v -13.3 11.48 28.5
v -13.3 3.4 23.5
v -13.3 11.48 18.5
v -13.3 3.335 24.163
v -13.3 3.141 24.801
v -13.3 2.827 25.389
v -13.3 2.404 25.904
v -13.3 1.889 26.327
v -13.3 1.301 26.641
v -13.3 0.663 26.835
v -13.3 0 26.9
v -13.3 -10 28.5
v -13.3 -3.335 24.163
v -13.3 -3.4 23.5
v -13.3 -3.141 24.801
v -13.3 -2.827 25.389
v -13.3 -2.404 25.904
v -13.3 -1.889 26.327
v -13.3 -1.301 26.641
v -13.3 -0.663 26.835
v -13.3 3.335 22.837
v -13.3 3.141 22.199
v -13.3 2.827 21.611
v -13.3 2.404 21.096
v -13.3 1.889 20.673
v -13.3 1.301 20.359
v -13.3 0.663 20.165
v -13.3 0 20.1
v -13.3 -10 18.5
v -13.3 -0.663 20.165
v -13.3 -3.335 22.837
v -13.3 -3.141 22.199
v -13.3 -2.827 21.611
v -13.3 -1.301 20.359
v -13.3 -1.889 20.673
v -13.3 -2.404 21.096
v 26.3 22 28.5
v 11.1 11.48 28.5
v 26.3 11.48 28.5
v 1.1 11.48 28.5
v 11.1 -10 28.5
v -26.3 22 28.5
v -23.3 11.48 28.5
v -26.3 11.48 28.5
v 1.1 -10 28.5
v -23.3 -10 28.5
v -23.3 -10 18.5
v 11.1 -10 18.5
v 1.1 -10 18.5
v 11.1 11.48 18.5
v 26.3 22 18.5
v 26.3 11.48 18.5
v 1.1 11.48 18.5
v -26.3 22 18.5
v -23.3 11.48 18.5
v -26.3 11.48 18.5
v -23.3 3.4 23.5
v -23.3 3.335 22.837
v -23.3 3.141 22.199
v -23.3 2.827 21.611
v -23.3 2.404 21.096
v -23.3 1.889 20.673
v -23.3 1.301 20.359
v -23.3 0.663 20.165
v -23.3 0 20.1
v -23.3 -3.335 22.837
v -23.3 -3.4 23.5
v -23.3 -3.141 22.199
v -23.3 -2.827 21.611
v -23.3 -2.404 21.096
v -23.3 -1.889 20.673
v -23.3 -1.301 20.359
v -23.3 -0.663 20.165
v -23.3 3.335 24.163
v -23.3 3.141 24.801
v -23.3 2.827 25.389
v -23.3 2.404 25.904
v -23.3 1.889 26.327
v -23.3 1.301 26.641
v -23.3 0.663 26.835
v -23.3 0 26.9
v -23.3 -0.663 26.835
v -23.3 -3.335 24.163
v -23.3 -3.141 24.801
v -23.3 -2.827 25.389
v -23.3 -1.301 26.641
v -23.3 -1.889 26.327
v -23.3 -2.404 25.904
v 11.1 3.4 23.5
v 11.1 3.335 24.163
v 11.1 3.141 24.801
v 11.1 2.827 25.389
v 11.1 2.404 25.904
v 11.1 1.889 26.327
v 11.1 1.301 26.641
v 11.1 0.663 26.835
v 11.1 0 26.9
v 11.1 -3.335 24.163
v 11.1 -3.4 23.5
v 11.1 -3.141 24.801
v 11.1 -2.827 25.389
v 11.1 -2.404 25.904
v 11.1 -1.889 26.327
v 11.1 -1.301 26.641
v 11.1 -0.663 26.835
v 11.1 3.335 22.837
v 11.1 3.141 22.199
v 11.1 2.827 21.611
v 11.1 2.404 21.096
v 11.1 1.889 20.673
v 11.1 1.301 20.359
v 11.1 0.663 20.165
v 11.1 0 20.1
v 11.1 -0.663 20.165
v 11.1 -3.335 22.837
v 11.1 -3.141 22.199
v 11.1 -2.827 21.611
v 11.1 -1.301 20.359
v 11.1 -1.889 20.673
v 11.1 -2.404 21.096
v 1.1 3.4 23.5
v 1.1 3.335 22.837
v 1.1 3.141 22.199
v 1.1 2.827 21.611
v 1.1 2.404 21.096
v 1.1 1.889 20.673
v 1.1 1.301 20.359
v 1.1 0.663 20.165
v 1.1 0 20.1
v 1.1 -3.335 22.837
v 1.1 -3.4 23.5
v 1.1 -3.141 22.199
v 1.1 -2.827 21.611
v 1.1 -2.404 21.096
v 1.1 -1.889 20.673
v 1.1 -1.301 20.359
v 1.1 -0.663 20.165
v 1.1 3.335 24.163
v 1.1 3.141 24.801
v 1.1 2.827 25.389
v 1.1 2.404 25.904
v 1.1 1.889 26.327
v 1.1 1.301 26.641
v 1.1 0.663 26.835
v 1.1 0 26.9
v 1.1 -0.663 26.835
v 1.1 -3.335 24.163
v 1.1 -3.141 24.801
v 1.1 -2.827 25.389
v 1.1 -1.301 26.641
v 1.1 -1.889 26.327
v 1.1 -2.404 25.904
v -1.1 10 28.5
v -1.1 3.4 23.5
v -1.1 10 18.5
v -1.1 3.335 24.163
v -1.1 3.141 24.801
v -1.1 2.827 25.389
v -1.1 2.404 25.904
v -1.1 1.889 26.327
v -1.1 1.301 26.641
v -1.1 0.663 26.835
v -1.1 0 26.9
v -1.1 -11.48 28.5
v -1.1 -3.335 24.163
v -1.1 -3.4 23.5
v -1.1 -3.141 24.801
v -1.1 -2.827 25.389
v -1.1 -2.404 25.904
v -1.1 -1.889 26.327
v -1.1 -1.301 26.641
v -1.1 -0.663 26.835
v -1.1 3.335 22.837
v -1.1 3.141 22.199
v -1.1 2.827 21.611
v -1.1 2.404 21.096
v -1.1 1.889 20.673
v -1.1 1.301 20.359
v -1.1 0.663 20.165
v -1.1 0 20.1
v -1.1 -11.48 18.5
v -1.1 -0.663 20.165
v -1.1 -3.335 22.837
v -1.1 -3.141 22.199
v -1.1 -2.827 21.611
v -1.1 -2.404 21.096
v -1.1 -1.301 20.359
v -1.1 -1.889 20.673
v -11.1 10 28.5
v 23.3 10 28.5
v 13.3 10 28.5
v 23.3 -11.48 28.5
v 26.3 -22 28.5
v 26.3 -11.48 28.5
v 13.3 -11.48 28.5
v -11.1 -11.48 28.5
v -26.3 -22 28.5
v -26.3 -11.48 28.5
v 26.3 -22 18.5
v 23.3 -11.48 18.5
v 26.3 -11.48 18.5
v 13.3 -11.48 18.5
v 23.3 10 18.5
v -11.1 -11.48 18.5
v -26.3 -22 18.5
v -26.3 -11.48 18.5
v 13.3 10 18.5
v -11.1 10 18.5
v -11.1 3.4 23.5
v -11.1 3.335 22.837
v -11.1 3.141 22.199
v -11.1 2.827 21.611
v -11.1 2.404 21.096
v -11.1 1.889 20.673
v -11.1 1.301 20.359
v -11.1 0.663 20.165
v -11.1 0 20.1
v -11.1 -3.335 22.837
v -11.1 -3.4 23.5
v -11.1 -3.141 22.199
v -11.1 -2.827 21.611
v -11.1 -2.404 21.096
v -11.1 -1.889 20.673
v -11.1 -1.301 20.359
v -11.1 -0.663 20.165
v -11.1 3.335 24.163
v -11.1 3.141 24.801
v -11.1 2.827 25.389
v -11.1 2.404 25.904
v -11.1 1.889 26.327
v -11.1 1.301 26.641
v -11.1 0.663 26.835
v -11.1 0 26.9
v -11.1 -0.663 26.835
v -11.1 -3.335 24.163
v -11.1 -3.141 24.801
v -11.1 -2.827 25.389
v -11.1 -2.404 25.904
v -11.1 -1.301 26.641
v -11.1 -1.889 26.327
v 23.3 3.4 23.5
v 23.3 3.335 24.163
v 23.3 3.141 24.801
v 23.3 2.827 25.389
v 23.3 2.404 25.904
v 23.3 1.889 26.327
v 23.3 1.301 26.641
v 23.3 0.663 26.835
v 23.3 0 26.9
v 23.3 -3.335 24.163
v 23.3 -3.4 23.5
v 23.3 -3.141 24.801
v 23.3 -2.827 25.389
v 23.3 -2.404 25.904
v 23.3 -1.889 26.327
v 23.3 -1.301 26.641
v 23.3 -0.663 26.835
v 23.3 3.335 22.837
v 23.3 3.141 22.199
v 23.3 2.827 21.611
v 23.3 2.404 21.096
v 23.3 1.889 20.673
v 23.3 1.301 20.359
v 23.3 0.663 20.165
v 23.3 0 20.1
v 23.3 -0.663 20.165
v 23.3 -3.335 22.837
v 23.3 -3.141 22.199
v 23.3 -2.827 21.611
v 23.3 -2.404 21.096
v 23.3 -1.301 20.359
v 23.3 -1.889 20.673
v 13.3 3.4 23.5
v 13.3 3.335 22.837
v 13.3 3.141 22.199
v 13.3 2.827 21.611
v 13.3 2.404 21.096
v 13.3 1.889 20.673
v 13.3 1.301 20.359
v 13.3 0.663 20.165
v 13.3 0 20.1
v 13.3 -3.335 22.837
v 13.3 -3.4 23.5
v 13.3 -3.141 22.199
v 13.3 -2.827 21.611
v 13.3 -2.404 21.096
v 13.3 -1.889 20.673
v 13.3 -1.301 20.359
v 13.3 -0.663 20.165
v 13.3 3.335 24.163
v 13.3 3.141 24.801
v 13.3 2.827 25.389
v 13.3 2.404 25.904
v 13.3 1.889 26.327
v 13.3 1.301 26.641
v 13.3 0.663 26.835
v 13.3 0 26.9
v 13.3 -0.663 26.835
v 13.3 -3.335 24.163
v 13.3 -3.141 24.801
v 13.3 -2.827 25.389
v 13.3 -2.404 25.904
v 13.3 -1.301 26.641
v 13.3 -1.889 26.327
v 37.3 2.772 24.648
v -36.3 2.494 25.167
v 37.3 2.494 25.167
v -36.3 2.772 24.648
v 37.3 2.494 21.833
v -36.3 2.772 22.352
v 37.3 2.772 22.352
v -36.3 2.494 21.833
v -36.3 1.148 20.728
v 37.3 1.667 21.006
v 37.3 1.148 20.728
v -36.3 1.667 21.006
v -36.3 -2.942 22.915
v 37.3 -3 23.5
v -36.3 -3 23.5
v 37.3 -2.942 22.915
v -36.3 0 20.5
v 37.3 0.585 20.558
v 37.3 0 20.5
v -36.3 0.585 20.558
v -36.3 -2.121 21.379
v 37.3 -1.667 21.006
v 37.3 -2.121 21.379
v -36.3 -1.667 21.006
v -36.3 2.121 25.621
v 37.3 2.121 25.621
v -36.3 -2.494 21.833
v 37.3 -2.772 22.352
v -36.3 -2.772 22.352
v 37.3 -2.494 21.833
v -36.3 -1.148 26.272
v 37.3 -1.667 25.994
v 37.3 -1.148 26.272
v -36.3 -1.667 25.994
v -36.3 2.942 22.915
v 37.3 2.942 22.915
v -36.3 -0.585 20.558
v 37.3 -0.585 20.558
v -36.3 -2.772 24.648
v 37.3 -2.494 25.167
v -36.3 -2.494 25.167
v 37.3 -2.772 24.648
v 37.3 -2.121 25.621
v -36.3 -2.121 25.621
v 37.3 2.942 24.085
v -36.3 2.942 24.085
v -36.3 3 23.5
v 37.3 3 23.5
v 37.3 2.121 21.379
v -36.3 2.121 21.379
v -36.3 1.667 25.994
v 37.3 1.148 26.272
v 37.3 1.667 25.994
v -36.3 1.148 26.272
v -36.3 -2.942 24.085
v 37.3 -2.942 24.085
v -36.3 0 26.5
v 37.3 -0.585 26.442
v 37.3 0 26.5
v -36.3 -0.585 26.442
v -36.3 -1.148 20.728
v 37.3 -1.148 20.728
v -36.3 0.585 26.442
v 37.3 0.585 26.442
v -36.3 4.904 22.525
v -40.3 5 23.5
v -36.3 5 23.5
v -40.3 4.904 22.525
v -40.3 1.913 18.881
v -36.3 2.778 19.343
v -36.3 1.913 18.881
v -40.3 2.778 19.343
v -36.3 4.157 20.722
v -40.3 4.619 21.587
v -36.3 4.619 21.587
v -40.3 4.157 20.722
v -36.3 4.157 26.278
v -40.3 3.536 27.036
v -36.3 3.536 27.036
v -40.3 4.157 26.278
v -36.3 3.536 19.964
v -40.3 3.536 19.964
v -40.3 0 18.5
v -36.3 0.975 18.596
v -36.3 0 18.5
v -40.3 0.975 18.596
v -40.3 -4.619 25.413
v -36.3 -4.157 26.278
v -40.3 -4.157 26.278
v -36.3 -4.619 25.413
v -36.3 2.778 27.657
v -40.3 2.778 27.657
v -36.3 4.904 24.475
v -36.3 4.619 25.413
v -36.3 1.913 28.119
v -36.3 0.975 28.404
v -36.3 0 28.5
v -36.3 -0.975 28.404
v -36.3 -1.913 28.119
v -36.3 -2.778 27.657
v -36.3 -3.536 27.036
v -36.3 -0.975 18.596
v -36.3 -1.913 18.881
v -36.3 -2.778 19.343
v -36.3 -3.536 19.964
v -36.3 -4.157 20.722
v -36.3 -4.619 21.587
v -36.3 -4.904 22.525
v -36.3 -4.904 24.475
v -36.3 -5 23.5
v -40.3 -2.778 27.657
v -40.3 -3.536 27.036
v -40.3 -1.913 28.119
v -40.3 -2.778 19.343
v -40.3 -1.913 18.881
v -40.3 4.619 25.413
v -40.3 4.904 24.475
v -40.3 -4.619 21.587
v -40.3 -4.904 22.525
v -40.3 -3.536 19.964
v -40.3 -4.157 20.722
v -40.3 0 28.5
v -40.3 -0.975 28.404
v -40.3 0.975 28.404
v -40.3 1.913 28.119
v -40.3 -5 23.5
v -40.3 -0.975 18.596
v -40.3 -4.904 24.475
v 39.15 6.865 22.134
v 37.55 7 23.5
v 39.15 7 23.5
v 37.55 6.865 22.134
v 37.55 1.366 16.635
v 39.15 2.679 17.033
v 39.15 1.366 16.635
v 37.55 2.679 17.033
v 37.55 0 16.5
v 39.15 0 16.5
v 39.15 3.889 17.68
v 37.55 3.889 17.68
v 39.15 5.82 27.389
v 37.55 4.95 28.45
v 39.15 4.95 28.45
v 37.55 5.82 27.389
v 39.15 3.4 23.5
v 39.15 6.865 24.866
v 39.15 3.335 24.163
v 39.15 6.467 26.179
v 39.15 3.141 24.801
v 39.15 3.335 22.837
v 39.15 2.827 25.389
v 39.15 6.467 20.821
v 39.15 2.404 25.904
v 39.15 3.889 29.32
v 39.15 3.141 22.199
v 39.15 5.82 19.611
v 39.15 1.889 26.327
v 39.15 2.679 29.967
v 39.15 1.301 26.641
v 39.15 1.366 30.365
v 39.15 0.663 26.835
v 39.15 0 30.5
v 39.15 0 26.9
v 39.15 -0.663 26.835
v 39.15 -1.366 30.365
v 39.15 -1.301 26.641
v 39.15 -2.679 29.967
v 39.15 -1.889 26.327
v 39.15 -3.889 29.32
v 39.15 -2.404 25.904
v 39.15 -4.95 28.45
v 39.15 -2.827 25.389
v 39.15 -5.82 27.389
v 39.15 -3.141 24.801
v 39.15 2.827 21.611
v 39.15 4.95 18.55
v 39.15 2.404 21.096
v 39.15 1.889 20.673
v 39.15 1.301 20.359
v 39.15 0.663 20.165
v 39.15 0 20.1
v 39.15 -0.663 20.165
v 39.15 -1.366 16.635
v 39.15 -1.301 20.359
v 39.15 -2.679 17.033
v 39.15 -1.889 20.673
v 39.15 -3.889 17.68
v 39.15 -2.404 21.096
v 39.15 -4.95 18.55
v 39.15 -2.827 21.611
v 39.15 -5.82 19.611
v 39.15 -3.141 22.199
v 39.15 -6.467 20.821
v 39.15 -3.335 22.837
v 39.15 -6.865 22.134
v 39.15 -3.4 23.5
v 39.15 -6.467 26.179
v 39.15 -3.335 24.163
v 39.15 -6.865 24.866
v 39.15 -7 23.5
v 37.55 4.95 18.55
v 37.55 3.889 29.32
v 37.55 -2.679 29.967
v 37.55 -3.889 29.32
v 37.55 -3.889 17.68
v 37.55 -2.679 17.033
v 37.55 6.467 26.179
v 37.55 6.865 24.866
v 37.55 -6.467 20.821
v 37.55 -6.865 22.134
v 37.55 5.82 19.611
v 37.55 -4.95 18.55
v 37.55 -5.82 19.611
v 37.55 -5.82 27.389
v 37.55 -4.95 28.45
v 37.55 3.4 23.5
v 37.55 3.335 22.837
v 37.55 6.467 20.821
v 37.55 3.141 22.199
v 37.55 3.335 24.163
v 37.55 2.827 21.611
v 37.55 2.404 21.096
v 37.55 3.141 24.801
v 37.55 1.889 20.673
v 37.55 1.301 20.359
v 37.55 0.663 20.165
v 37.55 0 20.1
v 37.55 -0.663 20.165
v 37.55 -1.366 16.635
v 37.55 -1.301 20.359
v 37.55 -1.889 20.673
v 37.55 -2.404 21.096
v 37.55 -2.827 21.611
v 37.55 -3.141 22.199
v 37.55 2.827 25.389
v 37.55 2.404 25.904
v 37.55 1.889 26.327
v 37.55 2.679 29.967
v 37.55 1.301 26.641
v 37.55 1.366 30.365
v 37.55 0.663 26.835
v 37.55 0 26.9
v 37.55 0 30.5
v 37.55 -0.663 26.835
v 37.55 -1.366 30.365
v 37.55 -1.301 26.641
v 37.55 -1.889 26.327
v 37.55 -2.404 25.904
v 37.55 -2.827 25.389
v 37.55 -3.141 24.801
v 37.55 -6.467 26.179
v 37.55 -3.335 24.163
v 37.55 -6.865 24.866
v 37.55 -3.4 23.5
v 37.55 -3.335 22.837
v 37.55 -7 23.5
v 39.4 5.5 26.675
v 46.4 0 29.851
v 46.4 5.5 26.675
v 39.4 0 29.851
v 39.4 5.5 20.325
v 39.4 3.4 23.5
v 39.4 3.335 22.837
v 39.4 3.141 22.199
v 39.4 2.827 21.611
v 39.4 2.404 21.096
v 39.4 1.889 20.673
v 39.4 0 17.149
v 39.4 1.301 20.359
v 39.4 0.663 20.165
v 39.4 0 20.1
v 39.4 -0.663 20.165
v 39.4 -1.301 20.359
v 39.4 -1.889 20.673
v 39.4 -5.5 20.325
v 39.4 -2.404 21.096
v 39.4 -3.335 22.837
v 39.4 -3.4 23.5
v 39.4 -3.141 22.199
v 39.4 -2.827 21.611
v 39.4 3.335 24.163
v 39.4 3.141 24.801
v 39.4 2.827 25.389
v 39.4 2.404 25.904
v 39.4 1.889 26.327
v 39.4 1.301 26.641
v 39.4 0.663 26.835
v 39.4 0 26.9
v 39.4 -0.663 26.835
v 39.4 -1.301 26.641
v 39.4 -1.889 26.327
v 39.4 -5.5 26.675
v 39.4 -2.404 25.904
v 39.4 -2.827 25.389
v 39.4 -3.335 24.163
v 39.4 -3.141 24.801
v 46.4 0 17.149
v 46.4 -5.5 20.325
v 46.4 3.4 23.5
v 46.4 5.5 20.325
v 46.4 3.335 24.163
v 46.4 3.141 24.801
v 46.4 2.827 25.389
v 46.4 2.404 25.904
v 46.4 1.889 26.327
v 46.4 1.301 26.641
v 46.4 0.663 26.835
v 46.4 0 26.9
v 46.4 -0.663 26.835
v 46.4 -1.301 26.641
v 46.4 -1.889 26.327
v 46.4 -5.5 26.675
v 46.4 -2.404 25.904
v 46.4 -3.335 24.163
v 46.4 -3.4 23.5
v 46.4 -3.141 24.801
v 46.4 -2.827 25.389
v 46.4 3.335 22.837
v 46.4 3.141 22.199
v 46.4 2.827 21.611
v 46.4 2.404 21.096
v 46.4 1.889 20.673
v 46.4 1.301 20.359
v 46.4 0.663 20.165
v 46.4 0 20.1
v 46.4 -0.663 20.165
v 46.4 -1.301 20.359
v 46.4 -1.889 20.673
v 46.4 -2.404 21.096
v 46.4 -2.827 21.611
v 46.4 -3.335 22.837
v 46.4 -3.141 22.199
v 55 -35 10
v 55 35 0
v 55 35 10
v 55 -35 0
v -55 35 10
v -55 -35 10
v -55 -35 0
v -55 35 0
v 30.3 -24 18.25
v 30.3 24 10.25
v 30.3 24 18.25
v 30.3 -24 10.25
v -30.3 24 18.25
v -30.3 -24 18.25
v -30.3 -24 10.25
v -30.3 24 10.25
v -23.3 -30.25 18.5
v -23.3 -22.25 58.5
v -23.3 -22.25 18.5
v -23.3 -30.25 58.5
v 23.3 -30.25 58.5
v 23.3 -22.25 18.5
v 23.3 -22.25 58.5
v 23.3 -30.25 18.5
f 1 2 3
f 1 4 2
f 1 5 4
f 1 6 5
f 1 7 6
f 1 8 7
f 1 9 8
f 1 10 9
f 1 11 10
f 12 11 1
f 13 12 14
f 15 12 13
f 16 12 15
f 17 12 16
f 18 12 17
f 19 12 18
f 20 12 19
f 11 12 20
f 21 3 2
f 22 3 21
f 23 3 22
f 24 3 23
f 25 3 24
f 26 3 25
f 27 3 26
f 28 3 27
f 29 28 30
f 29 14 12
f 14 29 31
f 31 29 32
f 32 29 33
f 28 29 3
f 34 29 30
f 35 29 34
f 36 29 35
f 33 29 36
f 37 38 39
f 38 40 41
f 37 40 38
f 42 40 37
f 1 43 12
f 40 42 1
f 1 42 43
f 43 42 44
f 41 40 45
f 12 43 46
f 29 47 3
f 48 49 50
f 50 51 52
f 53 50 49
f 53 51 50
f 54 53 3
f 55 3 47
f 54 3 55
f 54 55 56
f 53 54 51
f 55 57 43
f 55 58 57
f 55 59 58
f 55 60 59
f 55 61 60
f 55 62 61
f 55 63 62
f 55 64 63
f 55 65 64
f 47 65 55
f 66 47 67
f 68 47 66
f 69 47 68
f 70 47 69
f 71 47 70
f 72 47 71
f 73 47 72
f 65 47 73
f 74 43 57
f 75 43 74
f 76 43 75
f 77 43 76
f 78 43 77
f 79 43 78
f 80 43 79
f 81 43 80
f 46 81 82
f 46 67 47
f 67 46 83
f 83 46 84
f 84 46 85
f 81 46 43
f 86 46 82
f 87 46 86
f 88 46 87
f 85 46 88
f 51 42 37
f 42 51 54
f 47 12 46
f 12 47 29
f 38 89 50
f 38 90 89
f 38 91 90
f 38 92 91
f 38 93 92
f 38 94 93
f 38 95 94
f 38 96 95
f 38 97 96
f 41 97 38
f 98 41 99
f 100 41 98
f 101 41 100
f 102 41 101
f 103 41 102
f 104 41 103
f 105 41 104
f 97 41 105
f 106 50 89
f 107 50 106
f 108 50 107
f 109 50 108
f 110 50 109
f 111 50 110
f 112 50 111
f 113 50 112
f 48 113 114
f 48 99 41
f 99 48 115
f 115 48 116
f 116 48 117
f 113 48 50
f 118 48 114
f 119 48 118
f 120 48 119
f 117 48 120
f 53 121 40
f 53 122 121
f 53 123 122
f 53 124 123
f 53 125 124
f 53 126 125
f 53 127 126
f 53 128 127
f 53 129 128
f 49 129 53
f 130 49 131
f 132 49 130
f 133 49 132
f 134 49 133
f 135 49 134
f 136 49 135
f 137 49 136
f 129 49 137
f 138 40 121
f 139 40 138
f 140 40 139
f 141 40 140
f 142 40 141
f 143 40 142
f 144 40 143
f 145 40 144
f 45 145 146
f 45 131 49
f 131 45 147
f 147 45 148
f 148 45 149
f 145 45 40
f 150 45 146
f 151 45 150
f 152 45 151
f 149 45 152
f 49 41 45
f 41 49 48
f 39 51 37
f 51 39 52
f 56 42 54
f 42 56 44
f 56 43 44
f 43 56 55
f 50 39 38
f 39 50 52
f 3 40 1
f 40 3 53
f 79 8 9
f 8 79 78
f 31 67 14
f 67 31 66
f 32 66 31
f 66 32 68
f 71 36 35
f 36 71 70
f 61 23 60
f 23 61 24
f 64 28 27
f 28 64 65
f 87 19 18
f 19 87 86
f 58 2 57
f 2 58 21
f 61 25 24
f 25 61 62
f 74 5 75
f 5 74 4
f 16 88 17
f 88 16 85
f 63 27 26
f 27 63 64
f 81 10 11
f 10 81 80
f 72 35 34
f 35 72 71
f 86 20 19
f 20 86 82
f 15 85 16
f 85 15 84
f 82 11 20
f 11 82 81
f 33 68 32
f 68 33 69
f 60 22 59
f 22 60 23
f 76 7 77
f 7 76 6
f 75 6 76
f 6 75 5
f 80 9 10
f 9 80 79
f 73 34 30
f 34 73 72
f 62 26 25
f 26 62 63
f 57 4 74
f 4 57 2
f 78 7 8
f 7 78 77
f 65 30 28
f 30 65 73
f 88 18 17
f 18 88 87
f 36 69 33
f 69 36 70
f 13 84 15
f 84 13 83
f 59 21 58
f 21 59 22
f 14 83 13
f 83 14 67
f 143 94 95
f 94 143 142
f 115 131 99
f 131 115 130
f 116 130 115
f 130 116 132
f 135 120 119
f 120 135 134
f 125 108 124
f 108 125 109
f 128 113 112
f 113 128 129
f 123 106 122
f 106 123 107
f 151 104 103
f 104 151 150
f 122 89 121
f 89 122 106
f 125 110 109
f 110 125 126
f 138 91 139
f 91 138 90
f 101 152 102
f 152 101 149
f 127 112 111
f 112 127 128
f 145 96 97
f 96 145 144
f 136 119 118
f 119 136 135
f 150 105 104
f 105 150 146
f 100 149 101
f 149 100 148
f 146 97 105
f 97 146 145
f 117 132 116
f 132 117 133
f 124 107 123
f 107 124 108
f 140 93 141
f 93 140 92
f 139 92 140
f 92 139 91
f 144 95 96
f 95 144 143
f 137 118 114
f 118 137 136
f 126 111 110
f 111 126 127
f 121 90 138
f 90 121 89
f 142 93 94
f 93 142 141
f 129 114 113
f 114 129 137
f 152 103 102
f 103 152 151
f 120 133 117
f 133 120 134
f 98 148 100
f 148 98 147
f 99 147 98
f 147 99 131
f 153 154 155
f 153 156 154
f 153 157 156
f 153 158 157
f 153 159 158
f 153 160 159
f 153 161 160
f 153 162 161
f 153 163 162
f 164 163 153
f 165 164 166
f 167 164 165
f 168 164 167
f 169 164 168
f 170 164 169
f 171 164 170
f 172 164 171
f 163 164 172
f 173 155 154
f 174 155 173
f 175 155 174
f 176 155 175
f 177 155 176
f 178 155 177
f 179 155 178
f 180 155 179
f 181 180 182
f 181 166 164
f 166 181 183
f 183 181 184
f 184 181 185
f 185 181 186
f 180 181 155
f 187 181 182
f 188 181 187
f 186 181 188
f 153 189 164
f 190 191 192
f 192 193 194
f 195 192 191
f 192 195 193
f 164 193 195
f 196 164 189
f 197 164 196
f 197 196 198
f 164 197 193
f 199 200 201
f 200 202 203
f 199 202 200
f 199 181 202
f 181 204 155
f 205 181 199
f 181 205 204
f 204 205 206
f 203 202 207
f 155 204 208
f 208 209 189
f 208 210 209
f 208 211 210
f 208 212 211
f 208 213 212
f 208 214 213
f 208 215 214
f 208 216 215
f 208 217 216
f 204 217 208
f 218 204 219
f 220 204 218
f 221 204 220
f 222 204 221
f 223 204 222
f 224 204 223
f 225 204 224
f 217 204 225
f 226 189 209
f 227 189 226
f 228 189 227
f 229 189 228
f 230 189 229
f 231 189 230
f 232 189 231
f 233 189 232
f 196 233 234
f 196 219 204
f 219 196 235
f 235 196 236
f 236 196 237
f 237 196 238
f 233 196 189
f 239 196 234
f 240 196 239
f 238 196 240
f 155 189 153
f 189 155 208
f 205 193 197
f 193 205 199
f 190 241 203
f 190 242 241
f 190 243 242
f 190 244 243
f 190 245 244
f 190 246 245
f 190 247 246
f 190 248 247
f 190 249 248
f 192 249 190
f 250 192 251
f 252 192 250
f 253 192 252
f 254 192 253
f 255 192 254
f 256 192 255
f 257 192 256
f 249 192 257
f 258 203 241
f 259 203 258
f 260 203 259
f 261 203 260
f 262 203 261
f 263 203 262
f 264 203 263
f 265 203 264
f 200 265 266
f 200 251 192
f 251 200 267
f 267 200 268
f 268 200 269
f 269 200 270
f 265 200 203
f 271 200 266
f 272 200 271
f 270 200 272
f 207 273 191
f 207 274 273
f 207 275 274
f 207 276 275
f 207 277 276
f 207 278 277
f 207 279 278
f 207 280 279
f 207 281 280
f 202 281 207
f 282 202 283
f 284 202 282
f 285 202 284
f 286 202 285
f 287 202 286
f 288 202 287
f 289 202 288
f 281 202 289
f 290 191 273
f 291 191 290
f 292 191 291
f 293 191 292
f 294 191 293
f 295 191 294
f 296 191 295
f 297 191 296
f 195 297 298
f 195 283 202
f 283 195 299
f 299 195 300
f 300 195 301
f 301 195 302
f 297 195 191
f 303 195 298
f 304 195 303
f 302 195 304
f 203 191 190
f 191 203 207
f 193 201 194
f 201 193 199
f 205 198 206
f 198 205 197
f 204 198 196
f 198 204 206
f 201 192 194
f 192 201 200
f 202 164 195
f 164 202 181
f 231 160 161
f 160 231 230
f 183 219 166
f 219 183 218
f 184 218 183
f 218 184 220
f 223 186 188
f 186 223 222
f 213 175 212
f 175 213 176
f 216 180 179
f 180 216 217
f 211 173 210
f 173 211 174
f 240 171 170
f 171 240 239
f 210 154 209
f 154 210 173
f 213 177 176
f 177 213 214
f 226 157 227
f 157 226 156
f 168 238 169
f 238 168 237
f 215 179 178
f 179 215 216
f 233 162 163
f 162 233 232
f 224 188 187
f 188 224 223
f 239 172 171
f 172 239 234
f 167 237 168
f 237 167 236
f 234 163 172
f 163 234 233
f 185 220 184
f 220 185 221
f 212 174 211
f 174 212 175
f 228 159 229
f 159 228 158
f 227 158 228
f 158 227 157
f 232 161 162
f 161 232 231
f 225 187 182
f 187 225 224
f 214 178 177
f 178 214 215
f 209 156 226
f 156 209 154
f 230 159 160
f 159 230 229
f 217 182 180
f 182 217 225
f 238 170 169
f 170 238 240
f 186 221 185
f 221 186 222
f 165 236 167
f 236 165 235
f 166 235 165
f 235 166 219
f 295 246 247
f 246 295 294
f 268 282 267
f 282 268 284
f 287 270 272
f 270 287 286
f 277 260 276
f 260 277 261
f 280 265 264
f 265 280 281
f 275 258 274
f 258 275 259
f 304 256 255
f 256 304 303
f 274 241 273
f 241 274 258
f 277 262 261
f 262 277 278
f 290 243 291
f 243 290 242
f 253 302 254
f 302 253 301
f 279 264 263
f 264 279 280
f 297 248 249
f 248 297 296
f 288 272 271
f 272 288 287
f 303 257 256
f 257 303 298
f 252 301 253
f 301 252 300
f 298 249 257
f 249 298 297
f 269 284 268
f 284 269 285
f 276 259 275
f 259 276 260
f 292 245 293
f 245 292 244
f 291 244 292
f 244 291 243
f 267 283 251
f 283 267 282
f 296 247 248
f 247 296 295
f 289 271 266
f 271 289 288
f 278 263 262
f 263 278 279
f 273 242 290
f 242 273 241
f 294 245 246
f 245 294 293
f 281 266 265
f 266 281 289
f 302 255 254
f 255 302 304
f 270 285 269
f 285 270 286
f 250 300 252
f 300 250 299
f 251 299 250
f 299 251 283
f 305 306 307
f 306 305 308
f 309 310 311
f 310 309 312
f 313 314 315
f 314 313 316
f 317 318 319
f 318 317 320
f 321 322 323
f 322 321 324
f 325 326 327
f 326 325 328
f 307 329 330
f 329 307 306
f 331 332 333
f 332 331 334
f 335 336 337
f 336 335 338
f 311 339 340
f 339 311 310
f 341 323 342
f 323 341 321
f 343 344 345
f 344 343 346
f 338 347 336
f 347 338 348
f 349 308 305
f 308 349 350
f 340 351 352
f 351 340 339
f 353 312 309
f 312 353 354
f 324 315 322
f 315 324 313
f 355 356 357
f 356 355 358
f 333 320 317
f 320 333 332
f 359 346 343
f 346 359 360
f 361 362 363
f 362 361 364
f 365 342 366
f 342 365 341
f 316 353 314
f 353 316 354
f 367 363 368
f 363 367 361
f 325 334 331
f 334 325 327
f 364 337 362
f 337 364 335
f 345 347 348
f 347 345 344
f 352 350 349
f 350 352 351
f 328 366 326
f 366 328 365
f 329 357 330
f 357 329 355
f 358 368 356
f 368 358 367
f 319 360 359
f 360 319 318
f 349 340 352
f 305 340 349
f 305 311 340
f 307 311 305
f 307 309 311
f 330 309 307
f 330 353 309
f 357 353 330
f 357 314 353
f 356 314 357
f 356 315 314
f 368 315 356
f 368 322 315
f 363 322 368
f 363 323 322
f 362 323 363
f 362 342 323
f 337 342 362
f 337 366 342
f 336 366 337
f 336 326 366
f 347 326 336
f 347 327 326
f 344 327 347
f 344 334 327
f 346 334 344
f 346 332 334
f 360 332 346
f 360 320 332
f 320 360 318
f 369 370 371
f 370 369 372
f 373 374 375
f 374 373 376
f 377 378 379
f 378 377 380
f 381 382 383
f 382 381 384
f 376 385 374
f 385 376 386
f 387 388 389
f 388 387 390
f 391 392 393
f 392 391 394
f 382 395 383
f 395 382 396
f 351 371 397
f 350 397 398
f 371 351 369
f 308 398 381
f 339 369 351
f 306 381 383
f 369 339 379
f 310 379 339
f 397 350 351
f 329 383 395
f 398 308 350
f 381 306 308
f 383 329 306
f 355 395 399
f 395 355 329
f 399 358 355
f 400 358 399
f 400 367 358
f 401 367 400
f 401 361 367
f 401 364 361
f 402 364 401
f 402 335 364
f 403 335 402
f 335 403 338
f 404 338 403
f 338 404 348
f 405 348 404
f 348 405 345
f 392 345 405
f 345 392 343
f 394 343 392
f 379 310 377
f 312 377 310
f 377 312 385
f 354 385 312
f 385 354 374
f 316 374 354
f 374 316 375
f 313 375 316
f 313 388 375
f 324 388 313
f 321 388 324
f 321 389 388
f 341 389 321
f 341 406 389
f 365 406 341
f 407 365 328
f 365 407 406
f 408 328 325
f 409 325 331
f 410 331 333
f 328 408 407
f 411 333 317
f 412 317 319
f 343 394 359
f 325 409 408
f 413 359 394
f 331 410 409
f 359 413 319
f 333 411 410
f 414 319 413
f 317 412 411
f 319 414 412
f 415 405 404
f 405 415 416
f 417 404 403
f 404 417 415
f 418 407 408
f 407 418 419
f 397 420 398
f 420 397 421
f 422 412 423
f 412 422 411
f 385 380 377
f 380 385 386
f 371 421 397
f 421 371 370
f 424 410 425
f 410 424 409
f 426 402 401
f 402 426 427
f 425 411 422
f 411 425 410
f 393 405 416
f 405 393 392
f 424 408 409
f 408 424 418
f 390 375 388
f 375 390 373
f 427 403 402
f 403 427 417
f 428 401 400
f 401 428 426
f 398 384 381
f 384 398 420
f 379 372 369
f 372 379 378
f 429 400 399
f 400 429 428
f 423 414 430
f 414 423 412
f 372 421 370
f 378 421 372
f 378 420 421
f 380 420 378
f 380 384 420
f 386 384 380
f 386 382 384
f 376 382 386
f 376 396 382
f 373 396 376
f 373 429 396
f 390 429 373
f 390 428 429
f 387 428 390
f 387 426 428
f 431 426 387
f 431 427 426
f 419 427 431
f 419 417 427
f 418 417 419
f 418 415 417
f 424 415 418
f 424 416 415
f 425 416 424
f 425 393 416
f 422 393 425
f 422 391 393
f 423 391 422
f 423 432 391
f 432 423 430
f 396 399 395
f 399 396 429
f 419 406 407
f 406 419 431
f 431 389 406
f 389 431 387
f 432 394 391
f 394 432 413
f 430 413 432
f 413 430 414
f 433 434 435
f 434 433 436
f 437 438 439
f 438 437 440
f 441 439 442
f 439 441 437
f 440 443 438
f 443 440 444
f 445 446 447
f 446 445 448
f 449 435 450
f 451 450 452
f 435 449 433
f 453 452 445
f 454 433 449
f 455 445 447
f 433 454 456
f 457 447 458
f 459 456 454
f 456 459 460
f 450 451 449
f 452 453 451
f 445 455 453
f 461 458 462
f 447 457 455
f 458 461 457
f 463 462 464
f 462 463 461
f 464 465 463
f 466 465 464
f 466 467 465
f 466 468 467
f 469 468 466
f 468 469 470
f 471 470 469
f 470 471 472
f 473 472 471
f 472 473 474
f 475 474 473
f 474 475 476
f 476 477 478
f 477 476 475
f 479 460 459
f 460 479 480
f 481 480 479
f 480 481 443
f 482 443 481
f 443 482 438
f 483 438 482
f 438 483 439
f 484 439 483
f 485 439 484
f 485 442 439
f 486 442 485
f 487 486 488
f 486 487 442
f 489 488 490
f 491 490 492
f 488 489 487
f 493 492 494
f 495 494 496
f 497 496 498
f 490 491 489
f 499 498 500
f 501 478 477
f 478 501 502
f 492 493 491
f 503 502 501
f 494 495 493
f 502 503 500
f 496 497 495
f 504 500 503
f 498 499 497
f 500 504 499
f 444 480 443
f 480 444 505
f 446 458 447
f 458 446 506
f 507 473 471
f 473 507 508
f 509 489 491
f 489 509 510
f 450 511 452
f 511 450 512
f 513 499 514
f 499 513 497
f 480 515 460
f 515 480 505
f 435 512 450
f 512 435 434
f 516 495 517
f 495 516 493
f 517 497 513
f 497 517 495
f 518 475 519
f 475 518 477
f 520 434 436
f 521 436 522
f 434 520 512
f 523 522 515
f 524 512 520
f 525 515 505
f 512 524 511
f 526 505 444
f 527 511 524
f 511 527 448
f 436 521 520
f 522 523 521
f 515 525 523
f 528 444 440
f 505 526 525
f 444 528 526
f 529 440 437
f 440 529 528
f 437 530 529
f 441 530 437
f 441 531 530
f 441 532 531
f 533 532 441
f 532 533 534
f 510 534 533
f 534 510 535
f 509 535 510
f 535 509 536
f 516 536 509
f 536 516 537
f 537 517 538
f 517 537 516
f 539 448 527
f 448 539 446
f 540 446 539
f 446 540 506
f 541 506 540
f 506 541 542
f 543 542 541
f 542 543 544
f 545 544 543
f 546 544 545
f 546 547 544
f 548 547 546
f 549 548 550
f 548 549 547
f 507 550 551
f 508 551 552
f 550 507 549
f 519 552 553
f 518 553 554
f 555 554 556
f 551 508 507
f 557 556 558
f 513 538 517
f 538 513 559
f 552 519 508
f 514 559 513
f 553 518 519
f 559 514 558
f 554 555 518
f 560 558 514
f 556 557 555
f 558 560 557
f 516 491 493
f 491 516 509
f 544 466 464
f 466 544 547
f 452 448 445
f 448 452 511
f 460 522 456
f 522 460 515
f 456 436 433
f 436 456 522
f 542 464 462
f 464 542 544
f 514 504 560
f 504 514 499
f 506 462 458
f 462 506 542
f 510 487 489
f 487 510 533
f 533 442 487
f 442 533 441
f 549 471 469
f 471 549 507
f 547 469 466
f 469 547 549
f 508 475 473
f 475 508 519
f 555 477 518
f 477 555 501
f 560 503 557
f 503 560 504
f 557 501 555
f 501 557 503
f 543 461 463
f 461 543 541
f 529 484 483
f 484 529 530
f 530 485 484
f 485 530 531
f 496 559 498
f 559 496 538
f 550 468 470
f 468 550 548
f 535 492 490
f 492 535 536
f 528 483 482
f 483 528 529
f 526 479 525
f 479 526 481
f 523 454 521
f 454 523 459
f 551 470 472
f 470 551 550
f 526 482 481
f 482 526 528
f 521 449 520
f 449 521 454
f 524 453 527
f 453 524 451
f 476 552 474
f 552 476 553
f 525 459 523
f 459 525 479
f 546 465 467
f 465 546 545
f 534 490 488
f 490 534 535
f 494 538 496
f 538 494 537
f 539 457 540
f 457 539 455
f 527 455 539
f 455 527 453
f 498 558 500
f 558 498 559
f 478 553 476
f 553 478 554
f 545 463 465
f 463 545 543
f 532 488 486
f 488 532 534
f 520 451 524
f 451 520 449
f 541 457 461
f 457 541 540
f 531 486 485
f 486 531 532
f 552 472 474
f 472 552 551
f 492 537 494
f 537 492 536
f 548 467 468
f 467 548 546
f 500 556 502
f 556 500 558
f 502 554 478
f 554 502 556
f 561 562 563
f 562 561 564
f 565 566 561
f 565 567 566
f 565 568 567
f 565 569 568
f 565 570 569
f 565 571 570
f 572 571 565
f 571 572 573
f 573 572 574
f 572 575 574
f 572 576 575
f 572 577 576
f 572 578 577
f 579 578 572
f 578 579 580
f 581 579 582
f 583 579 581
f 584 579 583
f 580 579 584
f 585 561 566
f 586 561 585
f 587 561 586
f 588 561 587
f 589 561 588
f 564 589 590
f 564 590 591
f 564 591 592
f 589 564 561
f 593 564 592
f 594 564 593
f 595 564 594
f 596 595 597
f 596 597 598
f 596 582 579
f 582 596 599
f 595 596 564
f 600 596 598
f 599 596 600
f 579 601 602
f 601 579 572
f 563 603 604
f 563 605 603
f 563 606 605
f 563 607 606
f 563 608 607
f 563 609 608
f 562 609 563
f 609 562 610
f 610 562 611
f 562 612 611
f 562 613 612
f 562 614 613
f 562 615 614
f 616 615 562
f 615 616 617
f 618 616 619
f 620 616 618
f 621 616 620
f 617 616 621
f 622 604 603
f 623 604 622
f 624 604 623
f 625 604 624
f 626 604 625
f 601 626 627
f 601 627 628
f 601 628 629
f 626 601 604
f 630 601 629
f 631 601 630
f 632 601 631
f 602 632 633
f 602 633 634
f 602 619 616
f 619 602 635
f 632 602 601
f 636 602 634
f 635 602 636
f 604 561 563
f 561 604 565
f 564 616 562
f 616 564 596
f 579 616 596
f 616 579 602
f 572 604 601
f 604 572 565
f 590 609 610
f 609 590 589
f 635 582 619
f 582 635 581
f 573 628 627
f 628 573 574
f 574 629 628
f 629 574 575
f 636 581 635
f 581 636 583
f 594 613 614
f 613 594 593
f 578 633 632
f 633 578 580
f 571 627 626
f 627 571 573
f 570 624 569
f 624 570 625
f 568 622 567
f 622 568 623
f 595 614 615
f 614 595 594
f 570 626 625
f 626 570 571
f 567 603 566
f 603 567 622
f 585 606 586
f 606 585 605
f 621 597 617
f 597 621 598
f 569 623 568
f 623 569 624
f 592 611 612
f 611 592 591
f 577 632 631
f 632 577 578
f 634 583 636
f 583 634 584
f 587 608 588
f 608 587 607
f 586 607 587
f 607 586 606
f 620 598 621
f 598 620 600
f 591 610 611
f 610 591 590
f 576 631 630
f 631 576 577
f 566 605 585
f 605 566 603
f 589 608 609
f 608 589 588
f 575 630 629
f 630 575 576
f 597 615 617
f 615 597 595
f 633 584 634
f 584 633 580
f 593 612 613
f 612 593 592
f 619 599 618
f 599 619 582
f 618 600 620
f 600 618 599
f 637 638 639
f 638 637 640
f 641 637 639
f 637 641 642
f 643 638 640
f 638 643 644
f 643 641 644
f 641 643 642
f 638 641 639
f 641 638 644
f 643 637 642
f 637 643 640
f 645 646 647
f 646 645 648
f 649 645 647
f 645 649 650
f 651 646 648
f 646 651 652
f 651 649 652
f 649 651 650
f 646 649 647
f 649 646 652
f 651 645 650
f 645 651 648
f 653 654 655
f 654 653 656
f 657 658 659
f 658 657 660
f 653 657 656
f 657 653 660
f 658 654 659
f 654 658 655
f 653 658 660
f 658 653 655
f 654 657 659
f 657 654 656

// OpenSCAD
$fn = 32;

// ------------------------------------------------------------------------
// Comb hinge with flap: leaf 52.6 x 22 mm, pin d6, flap 40 mm
// Every part is its own module, assembly() places every instance.
// ------------------------------------------------------------------------

// --- part 1 ---
module hinge_bed() {
  difference() {
    translate([-55, -35, 0]) cube([110, 70, 10]);
  }
}

// --- part 2 ---
module hinge_riser() {
  difference() {
    translate([-30.3, -24, 0]) cube([60.6, 48, 8]);
  }
}

// --- part 3 ---
module hinge_leaf_a() {
  difference() {
    union() {
      translate([-23.3, -10, -5]) cube([10, 32, 10]);
      translate([1.1, -10, -5]) cube([10, 32, 10]);
      translate([-26.3, 11.48, -5]) cube([52.6, 10.52, 10]);
    }
    translate([-18.3, 0, 0]) rotate([0, 90, 0]) cylinder(h = 12, d = 6.8, center = true);
    translate([6.1, 0, 0]) rotate([0, 90, 0]) cylinder(h = 12, d = 6.8, center = true);
  }
}

// --- part 4 ---
module hinge_leaf_b() {
  difference() {
    union() {
      translate([-11.1, -22, -5]) cube([10, 32, 10]);
      translate([13.3, -22, -5]) cube([10, 32, 10]);
      translate([-26.3, -22, -5]) cube([52.6, 10.52, 10]);
    }
    translate([-6.1, 0, 0]) rotate([0, 90, 0]) cylinder(h = 12, d = 6.8, center = true);
    translate([18.3, 0, 0]) rotate([0, 90, 0]) cylinder(h = 12, d = 6.8, center = true);
  }
}

// --- part 5 ---
module hinge_flap() {
  difference() {
    translate([-23.3, -20, 0]) cube([46.6, 40, 8]);
  }
}

// --- part 6 ---
module hinge_pin() {
  rotate([0, 90, 0]) cylinder(h = 74.6, d = 6, center = true);
  translate([-40.3, 0, 0]) rotate([0, 90, 0]) cylinder(h = 4, d = 10);
}

// --- part 7 ---
module pin_washer() {
  difference() {
      translate([0, 0, 0]) cylinder(h = 1.6, d = 14);
      translate([0, 0, -1]) cylinder(h = 3.6, d = 6.8);
    }
}

// --- part 8 ---
module pin_nut() {
  difference() {
    linear_extrude(height = 7) polygon(points = [[6.351, 0], [3.175, 5.5], [-3.175, 5.5], [-6.351, 0], [-3.175, -5.5], [3.175, -5.5]]);
    translate([0, 0, -1]) cylinder(h = 9, d = 6.8);
  }
}

// --- assembly ---
module assembly() {
  color([0.80, 0.24, 0.20]) translate([0, 0, 0]) rotate([0, 0, 0]) hinge_bed();
  color([0.20, 0.45, 0.75]) translate([0, 0, 10.25]) rotate([0, 0, 0]) hinge_riser();
  color([0.25, 0.62, 0.32]) translate([0, 0, 23.5]) rotate([0, 0, 0]) hinge_leaf_a();
  color([0.92, 0.70, 0.18]) translate([0, 0, 23.5]) rotate([0, 0, 0]) hinge_leaf_b();
  color([0.58, 0.35, 0.70]) translate([0, -22.25, 38.5]) rotate([90, 0, 0]) hinge_flap();
  color([0.16, 0.66, 0.66]) translate([0, 0, 23.5]) rotate([0, 0, 0]) hinge_pin();
  color([0.85, 0.48, 0.18]) translate([37.55, 0, 23.5]) rotate([0, 90, 0]) pin_washer();
  color([0.55, 0.60, 0.65]) translate([39.4, 0, 23.5]) rotate([0, 90, 0]) pin_nut();
}

assembly();
